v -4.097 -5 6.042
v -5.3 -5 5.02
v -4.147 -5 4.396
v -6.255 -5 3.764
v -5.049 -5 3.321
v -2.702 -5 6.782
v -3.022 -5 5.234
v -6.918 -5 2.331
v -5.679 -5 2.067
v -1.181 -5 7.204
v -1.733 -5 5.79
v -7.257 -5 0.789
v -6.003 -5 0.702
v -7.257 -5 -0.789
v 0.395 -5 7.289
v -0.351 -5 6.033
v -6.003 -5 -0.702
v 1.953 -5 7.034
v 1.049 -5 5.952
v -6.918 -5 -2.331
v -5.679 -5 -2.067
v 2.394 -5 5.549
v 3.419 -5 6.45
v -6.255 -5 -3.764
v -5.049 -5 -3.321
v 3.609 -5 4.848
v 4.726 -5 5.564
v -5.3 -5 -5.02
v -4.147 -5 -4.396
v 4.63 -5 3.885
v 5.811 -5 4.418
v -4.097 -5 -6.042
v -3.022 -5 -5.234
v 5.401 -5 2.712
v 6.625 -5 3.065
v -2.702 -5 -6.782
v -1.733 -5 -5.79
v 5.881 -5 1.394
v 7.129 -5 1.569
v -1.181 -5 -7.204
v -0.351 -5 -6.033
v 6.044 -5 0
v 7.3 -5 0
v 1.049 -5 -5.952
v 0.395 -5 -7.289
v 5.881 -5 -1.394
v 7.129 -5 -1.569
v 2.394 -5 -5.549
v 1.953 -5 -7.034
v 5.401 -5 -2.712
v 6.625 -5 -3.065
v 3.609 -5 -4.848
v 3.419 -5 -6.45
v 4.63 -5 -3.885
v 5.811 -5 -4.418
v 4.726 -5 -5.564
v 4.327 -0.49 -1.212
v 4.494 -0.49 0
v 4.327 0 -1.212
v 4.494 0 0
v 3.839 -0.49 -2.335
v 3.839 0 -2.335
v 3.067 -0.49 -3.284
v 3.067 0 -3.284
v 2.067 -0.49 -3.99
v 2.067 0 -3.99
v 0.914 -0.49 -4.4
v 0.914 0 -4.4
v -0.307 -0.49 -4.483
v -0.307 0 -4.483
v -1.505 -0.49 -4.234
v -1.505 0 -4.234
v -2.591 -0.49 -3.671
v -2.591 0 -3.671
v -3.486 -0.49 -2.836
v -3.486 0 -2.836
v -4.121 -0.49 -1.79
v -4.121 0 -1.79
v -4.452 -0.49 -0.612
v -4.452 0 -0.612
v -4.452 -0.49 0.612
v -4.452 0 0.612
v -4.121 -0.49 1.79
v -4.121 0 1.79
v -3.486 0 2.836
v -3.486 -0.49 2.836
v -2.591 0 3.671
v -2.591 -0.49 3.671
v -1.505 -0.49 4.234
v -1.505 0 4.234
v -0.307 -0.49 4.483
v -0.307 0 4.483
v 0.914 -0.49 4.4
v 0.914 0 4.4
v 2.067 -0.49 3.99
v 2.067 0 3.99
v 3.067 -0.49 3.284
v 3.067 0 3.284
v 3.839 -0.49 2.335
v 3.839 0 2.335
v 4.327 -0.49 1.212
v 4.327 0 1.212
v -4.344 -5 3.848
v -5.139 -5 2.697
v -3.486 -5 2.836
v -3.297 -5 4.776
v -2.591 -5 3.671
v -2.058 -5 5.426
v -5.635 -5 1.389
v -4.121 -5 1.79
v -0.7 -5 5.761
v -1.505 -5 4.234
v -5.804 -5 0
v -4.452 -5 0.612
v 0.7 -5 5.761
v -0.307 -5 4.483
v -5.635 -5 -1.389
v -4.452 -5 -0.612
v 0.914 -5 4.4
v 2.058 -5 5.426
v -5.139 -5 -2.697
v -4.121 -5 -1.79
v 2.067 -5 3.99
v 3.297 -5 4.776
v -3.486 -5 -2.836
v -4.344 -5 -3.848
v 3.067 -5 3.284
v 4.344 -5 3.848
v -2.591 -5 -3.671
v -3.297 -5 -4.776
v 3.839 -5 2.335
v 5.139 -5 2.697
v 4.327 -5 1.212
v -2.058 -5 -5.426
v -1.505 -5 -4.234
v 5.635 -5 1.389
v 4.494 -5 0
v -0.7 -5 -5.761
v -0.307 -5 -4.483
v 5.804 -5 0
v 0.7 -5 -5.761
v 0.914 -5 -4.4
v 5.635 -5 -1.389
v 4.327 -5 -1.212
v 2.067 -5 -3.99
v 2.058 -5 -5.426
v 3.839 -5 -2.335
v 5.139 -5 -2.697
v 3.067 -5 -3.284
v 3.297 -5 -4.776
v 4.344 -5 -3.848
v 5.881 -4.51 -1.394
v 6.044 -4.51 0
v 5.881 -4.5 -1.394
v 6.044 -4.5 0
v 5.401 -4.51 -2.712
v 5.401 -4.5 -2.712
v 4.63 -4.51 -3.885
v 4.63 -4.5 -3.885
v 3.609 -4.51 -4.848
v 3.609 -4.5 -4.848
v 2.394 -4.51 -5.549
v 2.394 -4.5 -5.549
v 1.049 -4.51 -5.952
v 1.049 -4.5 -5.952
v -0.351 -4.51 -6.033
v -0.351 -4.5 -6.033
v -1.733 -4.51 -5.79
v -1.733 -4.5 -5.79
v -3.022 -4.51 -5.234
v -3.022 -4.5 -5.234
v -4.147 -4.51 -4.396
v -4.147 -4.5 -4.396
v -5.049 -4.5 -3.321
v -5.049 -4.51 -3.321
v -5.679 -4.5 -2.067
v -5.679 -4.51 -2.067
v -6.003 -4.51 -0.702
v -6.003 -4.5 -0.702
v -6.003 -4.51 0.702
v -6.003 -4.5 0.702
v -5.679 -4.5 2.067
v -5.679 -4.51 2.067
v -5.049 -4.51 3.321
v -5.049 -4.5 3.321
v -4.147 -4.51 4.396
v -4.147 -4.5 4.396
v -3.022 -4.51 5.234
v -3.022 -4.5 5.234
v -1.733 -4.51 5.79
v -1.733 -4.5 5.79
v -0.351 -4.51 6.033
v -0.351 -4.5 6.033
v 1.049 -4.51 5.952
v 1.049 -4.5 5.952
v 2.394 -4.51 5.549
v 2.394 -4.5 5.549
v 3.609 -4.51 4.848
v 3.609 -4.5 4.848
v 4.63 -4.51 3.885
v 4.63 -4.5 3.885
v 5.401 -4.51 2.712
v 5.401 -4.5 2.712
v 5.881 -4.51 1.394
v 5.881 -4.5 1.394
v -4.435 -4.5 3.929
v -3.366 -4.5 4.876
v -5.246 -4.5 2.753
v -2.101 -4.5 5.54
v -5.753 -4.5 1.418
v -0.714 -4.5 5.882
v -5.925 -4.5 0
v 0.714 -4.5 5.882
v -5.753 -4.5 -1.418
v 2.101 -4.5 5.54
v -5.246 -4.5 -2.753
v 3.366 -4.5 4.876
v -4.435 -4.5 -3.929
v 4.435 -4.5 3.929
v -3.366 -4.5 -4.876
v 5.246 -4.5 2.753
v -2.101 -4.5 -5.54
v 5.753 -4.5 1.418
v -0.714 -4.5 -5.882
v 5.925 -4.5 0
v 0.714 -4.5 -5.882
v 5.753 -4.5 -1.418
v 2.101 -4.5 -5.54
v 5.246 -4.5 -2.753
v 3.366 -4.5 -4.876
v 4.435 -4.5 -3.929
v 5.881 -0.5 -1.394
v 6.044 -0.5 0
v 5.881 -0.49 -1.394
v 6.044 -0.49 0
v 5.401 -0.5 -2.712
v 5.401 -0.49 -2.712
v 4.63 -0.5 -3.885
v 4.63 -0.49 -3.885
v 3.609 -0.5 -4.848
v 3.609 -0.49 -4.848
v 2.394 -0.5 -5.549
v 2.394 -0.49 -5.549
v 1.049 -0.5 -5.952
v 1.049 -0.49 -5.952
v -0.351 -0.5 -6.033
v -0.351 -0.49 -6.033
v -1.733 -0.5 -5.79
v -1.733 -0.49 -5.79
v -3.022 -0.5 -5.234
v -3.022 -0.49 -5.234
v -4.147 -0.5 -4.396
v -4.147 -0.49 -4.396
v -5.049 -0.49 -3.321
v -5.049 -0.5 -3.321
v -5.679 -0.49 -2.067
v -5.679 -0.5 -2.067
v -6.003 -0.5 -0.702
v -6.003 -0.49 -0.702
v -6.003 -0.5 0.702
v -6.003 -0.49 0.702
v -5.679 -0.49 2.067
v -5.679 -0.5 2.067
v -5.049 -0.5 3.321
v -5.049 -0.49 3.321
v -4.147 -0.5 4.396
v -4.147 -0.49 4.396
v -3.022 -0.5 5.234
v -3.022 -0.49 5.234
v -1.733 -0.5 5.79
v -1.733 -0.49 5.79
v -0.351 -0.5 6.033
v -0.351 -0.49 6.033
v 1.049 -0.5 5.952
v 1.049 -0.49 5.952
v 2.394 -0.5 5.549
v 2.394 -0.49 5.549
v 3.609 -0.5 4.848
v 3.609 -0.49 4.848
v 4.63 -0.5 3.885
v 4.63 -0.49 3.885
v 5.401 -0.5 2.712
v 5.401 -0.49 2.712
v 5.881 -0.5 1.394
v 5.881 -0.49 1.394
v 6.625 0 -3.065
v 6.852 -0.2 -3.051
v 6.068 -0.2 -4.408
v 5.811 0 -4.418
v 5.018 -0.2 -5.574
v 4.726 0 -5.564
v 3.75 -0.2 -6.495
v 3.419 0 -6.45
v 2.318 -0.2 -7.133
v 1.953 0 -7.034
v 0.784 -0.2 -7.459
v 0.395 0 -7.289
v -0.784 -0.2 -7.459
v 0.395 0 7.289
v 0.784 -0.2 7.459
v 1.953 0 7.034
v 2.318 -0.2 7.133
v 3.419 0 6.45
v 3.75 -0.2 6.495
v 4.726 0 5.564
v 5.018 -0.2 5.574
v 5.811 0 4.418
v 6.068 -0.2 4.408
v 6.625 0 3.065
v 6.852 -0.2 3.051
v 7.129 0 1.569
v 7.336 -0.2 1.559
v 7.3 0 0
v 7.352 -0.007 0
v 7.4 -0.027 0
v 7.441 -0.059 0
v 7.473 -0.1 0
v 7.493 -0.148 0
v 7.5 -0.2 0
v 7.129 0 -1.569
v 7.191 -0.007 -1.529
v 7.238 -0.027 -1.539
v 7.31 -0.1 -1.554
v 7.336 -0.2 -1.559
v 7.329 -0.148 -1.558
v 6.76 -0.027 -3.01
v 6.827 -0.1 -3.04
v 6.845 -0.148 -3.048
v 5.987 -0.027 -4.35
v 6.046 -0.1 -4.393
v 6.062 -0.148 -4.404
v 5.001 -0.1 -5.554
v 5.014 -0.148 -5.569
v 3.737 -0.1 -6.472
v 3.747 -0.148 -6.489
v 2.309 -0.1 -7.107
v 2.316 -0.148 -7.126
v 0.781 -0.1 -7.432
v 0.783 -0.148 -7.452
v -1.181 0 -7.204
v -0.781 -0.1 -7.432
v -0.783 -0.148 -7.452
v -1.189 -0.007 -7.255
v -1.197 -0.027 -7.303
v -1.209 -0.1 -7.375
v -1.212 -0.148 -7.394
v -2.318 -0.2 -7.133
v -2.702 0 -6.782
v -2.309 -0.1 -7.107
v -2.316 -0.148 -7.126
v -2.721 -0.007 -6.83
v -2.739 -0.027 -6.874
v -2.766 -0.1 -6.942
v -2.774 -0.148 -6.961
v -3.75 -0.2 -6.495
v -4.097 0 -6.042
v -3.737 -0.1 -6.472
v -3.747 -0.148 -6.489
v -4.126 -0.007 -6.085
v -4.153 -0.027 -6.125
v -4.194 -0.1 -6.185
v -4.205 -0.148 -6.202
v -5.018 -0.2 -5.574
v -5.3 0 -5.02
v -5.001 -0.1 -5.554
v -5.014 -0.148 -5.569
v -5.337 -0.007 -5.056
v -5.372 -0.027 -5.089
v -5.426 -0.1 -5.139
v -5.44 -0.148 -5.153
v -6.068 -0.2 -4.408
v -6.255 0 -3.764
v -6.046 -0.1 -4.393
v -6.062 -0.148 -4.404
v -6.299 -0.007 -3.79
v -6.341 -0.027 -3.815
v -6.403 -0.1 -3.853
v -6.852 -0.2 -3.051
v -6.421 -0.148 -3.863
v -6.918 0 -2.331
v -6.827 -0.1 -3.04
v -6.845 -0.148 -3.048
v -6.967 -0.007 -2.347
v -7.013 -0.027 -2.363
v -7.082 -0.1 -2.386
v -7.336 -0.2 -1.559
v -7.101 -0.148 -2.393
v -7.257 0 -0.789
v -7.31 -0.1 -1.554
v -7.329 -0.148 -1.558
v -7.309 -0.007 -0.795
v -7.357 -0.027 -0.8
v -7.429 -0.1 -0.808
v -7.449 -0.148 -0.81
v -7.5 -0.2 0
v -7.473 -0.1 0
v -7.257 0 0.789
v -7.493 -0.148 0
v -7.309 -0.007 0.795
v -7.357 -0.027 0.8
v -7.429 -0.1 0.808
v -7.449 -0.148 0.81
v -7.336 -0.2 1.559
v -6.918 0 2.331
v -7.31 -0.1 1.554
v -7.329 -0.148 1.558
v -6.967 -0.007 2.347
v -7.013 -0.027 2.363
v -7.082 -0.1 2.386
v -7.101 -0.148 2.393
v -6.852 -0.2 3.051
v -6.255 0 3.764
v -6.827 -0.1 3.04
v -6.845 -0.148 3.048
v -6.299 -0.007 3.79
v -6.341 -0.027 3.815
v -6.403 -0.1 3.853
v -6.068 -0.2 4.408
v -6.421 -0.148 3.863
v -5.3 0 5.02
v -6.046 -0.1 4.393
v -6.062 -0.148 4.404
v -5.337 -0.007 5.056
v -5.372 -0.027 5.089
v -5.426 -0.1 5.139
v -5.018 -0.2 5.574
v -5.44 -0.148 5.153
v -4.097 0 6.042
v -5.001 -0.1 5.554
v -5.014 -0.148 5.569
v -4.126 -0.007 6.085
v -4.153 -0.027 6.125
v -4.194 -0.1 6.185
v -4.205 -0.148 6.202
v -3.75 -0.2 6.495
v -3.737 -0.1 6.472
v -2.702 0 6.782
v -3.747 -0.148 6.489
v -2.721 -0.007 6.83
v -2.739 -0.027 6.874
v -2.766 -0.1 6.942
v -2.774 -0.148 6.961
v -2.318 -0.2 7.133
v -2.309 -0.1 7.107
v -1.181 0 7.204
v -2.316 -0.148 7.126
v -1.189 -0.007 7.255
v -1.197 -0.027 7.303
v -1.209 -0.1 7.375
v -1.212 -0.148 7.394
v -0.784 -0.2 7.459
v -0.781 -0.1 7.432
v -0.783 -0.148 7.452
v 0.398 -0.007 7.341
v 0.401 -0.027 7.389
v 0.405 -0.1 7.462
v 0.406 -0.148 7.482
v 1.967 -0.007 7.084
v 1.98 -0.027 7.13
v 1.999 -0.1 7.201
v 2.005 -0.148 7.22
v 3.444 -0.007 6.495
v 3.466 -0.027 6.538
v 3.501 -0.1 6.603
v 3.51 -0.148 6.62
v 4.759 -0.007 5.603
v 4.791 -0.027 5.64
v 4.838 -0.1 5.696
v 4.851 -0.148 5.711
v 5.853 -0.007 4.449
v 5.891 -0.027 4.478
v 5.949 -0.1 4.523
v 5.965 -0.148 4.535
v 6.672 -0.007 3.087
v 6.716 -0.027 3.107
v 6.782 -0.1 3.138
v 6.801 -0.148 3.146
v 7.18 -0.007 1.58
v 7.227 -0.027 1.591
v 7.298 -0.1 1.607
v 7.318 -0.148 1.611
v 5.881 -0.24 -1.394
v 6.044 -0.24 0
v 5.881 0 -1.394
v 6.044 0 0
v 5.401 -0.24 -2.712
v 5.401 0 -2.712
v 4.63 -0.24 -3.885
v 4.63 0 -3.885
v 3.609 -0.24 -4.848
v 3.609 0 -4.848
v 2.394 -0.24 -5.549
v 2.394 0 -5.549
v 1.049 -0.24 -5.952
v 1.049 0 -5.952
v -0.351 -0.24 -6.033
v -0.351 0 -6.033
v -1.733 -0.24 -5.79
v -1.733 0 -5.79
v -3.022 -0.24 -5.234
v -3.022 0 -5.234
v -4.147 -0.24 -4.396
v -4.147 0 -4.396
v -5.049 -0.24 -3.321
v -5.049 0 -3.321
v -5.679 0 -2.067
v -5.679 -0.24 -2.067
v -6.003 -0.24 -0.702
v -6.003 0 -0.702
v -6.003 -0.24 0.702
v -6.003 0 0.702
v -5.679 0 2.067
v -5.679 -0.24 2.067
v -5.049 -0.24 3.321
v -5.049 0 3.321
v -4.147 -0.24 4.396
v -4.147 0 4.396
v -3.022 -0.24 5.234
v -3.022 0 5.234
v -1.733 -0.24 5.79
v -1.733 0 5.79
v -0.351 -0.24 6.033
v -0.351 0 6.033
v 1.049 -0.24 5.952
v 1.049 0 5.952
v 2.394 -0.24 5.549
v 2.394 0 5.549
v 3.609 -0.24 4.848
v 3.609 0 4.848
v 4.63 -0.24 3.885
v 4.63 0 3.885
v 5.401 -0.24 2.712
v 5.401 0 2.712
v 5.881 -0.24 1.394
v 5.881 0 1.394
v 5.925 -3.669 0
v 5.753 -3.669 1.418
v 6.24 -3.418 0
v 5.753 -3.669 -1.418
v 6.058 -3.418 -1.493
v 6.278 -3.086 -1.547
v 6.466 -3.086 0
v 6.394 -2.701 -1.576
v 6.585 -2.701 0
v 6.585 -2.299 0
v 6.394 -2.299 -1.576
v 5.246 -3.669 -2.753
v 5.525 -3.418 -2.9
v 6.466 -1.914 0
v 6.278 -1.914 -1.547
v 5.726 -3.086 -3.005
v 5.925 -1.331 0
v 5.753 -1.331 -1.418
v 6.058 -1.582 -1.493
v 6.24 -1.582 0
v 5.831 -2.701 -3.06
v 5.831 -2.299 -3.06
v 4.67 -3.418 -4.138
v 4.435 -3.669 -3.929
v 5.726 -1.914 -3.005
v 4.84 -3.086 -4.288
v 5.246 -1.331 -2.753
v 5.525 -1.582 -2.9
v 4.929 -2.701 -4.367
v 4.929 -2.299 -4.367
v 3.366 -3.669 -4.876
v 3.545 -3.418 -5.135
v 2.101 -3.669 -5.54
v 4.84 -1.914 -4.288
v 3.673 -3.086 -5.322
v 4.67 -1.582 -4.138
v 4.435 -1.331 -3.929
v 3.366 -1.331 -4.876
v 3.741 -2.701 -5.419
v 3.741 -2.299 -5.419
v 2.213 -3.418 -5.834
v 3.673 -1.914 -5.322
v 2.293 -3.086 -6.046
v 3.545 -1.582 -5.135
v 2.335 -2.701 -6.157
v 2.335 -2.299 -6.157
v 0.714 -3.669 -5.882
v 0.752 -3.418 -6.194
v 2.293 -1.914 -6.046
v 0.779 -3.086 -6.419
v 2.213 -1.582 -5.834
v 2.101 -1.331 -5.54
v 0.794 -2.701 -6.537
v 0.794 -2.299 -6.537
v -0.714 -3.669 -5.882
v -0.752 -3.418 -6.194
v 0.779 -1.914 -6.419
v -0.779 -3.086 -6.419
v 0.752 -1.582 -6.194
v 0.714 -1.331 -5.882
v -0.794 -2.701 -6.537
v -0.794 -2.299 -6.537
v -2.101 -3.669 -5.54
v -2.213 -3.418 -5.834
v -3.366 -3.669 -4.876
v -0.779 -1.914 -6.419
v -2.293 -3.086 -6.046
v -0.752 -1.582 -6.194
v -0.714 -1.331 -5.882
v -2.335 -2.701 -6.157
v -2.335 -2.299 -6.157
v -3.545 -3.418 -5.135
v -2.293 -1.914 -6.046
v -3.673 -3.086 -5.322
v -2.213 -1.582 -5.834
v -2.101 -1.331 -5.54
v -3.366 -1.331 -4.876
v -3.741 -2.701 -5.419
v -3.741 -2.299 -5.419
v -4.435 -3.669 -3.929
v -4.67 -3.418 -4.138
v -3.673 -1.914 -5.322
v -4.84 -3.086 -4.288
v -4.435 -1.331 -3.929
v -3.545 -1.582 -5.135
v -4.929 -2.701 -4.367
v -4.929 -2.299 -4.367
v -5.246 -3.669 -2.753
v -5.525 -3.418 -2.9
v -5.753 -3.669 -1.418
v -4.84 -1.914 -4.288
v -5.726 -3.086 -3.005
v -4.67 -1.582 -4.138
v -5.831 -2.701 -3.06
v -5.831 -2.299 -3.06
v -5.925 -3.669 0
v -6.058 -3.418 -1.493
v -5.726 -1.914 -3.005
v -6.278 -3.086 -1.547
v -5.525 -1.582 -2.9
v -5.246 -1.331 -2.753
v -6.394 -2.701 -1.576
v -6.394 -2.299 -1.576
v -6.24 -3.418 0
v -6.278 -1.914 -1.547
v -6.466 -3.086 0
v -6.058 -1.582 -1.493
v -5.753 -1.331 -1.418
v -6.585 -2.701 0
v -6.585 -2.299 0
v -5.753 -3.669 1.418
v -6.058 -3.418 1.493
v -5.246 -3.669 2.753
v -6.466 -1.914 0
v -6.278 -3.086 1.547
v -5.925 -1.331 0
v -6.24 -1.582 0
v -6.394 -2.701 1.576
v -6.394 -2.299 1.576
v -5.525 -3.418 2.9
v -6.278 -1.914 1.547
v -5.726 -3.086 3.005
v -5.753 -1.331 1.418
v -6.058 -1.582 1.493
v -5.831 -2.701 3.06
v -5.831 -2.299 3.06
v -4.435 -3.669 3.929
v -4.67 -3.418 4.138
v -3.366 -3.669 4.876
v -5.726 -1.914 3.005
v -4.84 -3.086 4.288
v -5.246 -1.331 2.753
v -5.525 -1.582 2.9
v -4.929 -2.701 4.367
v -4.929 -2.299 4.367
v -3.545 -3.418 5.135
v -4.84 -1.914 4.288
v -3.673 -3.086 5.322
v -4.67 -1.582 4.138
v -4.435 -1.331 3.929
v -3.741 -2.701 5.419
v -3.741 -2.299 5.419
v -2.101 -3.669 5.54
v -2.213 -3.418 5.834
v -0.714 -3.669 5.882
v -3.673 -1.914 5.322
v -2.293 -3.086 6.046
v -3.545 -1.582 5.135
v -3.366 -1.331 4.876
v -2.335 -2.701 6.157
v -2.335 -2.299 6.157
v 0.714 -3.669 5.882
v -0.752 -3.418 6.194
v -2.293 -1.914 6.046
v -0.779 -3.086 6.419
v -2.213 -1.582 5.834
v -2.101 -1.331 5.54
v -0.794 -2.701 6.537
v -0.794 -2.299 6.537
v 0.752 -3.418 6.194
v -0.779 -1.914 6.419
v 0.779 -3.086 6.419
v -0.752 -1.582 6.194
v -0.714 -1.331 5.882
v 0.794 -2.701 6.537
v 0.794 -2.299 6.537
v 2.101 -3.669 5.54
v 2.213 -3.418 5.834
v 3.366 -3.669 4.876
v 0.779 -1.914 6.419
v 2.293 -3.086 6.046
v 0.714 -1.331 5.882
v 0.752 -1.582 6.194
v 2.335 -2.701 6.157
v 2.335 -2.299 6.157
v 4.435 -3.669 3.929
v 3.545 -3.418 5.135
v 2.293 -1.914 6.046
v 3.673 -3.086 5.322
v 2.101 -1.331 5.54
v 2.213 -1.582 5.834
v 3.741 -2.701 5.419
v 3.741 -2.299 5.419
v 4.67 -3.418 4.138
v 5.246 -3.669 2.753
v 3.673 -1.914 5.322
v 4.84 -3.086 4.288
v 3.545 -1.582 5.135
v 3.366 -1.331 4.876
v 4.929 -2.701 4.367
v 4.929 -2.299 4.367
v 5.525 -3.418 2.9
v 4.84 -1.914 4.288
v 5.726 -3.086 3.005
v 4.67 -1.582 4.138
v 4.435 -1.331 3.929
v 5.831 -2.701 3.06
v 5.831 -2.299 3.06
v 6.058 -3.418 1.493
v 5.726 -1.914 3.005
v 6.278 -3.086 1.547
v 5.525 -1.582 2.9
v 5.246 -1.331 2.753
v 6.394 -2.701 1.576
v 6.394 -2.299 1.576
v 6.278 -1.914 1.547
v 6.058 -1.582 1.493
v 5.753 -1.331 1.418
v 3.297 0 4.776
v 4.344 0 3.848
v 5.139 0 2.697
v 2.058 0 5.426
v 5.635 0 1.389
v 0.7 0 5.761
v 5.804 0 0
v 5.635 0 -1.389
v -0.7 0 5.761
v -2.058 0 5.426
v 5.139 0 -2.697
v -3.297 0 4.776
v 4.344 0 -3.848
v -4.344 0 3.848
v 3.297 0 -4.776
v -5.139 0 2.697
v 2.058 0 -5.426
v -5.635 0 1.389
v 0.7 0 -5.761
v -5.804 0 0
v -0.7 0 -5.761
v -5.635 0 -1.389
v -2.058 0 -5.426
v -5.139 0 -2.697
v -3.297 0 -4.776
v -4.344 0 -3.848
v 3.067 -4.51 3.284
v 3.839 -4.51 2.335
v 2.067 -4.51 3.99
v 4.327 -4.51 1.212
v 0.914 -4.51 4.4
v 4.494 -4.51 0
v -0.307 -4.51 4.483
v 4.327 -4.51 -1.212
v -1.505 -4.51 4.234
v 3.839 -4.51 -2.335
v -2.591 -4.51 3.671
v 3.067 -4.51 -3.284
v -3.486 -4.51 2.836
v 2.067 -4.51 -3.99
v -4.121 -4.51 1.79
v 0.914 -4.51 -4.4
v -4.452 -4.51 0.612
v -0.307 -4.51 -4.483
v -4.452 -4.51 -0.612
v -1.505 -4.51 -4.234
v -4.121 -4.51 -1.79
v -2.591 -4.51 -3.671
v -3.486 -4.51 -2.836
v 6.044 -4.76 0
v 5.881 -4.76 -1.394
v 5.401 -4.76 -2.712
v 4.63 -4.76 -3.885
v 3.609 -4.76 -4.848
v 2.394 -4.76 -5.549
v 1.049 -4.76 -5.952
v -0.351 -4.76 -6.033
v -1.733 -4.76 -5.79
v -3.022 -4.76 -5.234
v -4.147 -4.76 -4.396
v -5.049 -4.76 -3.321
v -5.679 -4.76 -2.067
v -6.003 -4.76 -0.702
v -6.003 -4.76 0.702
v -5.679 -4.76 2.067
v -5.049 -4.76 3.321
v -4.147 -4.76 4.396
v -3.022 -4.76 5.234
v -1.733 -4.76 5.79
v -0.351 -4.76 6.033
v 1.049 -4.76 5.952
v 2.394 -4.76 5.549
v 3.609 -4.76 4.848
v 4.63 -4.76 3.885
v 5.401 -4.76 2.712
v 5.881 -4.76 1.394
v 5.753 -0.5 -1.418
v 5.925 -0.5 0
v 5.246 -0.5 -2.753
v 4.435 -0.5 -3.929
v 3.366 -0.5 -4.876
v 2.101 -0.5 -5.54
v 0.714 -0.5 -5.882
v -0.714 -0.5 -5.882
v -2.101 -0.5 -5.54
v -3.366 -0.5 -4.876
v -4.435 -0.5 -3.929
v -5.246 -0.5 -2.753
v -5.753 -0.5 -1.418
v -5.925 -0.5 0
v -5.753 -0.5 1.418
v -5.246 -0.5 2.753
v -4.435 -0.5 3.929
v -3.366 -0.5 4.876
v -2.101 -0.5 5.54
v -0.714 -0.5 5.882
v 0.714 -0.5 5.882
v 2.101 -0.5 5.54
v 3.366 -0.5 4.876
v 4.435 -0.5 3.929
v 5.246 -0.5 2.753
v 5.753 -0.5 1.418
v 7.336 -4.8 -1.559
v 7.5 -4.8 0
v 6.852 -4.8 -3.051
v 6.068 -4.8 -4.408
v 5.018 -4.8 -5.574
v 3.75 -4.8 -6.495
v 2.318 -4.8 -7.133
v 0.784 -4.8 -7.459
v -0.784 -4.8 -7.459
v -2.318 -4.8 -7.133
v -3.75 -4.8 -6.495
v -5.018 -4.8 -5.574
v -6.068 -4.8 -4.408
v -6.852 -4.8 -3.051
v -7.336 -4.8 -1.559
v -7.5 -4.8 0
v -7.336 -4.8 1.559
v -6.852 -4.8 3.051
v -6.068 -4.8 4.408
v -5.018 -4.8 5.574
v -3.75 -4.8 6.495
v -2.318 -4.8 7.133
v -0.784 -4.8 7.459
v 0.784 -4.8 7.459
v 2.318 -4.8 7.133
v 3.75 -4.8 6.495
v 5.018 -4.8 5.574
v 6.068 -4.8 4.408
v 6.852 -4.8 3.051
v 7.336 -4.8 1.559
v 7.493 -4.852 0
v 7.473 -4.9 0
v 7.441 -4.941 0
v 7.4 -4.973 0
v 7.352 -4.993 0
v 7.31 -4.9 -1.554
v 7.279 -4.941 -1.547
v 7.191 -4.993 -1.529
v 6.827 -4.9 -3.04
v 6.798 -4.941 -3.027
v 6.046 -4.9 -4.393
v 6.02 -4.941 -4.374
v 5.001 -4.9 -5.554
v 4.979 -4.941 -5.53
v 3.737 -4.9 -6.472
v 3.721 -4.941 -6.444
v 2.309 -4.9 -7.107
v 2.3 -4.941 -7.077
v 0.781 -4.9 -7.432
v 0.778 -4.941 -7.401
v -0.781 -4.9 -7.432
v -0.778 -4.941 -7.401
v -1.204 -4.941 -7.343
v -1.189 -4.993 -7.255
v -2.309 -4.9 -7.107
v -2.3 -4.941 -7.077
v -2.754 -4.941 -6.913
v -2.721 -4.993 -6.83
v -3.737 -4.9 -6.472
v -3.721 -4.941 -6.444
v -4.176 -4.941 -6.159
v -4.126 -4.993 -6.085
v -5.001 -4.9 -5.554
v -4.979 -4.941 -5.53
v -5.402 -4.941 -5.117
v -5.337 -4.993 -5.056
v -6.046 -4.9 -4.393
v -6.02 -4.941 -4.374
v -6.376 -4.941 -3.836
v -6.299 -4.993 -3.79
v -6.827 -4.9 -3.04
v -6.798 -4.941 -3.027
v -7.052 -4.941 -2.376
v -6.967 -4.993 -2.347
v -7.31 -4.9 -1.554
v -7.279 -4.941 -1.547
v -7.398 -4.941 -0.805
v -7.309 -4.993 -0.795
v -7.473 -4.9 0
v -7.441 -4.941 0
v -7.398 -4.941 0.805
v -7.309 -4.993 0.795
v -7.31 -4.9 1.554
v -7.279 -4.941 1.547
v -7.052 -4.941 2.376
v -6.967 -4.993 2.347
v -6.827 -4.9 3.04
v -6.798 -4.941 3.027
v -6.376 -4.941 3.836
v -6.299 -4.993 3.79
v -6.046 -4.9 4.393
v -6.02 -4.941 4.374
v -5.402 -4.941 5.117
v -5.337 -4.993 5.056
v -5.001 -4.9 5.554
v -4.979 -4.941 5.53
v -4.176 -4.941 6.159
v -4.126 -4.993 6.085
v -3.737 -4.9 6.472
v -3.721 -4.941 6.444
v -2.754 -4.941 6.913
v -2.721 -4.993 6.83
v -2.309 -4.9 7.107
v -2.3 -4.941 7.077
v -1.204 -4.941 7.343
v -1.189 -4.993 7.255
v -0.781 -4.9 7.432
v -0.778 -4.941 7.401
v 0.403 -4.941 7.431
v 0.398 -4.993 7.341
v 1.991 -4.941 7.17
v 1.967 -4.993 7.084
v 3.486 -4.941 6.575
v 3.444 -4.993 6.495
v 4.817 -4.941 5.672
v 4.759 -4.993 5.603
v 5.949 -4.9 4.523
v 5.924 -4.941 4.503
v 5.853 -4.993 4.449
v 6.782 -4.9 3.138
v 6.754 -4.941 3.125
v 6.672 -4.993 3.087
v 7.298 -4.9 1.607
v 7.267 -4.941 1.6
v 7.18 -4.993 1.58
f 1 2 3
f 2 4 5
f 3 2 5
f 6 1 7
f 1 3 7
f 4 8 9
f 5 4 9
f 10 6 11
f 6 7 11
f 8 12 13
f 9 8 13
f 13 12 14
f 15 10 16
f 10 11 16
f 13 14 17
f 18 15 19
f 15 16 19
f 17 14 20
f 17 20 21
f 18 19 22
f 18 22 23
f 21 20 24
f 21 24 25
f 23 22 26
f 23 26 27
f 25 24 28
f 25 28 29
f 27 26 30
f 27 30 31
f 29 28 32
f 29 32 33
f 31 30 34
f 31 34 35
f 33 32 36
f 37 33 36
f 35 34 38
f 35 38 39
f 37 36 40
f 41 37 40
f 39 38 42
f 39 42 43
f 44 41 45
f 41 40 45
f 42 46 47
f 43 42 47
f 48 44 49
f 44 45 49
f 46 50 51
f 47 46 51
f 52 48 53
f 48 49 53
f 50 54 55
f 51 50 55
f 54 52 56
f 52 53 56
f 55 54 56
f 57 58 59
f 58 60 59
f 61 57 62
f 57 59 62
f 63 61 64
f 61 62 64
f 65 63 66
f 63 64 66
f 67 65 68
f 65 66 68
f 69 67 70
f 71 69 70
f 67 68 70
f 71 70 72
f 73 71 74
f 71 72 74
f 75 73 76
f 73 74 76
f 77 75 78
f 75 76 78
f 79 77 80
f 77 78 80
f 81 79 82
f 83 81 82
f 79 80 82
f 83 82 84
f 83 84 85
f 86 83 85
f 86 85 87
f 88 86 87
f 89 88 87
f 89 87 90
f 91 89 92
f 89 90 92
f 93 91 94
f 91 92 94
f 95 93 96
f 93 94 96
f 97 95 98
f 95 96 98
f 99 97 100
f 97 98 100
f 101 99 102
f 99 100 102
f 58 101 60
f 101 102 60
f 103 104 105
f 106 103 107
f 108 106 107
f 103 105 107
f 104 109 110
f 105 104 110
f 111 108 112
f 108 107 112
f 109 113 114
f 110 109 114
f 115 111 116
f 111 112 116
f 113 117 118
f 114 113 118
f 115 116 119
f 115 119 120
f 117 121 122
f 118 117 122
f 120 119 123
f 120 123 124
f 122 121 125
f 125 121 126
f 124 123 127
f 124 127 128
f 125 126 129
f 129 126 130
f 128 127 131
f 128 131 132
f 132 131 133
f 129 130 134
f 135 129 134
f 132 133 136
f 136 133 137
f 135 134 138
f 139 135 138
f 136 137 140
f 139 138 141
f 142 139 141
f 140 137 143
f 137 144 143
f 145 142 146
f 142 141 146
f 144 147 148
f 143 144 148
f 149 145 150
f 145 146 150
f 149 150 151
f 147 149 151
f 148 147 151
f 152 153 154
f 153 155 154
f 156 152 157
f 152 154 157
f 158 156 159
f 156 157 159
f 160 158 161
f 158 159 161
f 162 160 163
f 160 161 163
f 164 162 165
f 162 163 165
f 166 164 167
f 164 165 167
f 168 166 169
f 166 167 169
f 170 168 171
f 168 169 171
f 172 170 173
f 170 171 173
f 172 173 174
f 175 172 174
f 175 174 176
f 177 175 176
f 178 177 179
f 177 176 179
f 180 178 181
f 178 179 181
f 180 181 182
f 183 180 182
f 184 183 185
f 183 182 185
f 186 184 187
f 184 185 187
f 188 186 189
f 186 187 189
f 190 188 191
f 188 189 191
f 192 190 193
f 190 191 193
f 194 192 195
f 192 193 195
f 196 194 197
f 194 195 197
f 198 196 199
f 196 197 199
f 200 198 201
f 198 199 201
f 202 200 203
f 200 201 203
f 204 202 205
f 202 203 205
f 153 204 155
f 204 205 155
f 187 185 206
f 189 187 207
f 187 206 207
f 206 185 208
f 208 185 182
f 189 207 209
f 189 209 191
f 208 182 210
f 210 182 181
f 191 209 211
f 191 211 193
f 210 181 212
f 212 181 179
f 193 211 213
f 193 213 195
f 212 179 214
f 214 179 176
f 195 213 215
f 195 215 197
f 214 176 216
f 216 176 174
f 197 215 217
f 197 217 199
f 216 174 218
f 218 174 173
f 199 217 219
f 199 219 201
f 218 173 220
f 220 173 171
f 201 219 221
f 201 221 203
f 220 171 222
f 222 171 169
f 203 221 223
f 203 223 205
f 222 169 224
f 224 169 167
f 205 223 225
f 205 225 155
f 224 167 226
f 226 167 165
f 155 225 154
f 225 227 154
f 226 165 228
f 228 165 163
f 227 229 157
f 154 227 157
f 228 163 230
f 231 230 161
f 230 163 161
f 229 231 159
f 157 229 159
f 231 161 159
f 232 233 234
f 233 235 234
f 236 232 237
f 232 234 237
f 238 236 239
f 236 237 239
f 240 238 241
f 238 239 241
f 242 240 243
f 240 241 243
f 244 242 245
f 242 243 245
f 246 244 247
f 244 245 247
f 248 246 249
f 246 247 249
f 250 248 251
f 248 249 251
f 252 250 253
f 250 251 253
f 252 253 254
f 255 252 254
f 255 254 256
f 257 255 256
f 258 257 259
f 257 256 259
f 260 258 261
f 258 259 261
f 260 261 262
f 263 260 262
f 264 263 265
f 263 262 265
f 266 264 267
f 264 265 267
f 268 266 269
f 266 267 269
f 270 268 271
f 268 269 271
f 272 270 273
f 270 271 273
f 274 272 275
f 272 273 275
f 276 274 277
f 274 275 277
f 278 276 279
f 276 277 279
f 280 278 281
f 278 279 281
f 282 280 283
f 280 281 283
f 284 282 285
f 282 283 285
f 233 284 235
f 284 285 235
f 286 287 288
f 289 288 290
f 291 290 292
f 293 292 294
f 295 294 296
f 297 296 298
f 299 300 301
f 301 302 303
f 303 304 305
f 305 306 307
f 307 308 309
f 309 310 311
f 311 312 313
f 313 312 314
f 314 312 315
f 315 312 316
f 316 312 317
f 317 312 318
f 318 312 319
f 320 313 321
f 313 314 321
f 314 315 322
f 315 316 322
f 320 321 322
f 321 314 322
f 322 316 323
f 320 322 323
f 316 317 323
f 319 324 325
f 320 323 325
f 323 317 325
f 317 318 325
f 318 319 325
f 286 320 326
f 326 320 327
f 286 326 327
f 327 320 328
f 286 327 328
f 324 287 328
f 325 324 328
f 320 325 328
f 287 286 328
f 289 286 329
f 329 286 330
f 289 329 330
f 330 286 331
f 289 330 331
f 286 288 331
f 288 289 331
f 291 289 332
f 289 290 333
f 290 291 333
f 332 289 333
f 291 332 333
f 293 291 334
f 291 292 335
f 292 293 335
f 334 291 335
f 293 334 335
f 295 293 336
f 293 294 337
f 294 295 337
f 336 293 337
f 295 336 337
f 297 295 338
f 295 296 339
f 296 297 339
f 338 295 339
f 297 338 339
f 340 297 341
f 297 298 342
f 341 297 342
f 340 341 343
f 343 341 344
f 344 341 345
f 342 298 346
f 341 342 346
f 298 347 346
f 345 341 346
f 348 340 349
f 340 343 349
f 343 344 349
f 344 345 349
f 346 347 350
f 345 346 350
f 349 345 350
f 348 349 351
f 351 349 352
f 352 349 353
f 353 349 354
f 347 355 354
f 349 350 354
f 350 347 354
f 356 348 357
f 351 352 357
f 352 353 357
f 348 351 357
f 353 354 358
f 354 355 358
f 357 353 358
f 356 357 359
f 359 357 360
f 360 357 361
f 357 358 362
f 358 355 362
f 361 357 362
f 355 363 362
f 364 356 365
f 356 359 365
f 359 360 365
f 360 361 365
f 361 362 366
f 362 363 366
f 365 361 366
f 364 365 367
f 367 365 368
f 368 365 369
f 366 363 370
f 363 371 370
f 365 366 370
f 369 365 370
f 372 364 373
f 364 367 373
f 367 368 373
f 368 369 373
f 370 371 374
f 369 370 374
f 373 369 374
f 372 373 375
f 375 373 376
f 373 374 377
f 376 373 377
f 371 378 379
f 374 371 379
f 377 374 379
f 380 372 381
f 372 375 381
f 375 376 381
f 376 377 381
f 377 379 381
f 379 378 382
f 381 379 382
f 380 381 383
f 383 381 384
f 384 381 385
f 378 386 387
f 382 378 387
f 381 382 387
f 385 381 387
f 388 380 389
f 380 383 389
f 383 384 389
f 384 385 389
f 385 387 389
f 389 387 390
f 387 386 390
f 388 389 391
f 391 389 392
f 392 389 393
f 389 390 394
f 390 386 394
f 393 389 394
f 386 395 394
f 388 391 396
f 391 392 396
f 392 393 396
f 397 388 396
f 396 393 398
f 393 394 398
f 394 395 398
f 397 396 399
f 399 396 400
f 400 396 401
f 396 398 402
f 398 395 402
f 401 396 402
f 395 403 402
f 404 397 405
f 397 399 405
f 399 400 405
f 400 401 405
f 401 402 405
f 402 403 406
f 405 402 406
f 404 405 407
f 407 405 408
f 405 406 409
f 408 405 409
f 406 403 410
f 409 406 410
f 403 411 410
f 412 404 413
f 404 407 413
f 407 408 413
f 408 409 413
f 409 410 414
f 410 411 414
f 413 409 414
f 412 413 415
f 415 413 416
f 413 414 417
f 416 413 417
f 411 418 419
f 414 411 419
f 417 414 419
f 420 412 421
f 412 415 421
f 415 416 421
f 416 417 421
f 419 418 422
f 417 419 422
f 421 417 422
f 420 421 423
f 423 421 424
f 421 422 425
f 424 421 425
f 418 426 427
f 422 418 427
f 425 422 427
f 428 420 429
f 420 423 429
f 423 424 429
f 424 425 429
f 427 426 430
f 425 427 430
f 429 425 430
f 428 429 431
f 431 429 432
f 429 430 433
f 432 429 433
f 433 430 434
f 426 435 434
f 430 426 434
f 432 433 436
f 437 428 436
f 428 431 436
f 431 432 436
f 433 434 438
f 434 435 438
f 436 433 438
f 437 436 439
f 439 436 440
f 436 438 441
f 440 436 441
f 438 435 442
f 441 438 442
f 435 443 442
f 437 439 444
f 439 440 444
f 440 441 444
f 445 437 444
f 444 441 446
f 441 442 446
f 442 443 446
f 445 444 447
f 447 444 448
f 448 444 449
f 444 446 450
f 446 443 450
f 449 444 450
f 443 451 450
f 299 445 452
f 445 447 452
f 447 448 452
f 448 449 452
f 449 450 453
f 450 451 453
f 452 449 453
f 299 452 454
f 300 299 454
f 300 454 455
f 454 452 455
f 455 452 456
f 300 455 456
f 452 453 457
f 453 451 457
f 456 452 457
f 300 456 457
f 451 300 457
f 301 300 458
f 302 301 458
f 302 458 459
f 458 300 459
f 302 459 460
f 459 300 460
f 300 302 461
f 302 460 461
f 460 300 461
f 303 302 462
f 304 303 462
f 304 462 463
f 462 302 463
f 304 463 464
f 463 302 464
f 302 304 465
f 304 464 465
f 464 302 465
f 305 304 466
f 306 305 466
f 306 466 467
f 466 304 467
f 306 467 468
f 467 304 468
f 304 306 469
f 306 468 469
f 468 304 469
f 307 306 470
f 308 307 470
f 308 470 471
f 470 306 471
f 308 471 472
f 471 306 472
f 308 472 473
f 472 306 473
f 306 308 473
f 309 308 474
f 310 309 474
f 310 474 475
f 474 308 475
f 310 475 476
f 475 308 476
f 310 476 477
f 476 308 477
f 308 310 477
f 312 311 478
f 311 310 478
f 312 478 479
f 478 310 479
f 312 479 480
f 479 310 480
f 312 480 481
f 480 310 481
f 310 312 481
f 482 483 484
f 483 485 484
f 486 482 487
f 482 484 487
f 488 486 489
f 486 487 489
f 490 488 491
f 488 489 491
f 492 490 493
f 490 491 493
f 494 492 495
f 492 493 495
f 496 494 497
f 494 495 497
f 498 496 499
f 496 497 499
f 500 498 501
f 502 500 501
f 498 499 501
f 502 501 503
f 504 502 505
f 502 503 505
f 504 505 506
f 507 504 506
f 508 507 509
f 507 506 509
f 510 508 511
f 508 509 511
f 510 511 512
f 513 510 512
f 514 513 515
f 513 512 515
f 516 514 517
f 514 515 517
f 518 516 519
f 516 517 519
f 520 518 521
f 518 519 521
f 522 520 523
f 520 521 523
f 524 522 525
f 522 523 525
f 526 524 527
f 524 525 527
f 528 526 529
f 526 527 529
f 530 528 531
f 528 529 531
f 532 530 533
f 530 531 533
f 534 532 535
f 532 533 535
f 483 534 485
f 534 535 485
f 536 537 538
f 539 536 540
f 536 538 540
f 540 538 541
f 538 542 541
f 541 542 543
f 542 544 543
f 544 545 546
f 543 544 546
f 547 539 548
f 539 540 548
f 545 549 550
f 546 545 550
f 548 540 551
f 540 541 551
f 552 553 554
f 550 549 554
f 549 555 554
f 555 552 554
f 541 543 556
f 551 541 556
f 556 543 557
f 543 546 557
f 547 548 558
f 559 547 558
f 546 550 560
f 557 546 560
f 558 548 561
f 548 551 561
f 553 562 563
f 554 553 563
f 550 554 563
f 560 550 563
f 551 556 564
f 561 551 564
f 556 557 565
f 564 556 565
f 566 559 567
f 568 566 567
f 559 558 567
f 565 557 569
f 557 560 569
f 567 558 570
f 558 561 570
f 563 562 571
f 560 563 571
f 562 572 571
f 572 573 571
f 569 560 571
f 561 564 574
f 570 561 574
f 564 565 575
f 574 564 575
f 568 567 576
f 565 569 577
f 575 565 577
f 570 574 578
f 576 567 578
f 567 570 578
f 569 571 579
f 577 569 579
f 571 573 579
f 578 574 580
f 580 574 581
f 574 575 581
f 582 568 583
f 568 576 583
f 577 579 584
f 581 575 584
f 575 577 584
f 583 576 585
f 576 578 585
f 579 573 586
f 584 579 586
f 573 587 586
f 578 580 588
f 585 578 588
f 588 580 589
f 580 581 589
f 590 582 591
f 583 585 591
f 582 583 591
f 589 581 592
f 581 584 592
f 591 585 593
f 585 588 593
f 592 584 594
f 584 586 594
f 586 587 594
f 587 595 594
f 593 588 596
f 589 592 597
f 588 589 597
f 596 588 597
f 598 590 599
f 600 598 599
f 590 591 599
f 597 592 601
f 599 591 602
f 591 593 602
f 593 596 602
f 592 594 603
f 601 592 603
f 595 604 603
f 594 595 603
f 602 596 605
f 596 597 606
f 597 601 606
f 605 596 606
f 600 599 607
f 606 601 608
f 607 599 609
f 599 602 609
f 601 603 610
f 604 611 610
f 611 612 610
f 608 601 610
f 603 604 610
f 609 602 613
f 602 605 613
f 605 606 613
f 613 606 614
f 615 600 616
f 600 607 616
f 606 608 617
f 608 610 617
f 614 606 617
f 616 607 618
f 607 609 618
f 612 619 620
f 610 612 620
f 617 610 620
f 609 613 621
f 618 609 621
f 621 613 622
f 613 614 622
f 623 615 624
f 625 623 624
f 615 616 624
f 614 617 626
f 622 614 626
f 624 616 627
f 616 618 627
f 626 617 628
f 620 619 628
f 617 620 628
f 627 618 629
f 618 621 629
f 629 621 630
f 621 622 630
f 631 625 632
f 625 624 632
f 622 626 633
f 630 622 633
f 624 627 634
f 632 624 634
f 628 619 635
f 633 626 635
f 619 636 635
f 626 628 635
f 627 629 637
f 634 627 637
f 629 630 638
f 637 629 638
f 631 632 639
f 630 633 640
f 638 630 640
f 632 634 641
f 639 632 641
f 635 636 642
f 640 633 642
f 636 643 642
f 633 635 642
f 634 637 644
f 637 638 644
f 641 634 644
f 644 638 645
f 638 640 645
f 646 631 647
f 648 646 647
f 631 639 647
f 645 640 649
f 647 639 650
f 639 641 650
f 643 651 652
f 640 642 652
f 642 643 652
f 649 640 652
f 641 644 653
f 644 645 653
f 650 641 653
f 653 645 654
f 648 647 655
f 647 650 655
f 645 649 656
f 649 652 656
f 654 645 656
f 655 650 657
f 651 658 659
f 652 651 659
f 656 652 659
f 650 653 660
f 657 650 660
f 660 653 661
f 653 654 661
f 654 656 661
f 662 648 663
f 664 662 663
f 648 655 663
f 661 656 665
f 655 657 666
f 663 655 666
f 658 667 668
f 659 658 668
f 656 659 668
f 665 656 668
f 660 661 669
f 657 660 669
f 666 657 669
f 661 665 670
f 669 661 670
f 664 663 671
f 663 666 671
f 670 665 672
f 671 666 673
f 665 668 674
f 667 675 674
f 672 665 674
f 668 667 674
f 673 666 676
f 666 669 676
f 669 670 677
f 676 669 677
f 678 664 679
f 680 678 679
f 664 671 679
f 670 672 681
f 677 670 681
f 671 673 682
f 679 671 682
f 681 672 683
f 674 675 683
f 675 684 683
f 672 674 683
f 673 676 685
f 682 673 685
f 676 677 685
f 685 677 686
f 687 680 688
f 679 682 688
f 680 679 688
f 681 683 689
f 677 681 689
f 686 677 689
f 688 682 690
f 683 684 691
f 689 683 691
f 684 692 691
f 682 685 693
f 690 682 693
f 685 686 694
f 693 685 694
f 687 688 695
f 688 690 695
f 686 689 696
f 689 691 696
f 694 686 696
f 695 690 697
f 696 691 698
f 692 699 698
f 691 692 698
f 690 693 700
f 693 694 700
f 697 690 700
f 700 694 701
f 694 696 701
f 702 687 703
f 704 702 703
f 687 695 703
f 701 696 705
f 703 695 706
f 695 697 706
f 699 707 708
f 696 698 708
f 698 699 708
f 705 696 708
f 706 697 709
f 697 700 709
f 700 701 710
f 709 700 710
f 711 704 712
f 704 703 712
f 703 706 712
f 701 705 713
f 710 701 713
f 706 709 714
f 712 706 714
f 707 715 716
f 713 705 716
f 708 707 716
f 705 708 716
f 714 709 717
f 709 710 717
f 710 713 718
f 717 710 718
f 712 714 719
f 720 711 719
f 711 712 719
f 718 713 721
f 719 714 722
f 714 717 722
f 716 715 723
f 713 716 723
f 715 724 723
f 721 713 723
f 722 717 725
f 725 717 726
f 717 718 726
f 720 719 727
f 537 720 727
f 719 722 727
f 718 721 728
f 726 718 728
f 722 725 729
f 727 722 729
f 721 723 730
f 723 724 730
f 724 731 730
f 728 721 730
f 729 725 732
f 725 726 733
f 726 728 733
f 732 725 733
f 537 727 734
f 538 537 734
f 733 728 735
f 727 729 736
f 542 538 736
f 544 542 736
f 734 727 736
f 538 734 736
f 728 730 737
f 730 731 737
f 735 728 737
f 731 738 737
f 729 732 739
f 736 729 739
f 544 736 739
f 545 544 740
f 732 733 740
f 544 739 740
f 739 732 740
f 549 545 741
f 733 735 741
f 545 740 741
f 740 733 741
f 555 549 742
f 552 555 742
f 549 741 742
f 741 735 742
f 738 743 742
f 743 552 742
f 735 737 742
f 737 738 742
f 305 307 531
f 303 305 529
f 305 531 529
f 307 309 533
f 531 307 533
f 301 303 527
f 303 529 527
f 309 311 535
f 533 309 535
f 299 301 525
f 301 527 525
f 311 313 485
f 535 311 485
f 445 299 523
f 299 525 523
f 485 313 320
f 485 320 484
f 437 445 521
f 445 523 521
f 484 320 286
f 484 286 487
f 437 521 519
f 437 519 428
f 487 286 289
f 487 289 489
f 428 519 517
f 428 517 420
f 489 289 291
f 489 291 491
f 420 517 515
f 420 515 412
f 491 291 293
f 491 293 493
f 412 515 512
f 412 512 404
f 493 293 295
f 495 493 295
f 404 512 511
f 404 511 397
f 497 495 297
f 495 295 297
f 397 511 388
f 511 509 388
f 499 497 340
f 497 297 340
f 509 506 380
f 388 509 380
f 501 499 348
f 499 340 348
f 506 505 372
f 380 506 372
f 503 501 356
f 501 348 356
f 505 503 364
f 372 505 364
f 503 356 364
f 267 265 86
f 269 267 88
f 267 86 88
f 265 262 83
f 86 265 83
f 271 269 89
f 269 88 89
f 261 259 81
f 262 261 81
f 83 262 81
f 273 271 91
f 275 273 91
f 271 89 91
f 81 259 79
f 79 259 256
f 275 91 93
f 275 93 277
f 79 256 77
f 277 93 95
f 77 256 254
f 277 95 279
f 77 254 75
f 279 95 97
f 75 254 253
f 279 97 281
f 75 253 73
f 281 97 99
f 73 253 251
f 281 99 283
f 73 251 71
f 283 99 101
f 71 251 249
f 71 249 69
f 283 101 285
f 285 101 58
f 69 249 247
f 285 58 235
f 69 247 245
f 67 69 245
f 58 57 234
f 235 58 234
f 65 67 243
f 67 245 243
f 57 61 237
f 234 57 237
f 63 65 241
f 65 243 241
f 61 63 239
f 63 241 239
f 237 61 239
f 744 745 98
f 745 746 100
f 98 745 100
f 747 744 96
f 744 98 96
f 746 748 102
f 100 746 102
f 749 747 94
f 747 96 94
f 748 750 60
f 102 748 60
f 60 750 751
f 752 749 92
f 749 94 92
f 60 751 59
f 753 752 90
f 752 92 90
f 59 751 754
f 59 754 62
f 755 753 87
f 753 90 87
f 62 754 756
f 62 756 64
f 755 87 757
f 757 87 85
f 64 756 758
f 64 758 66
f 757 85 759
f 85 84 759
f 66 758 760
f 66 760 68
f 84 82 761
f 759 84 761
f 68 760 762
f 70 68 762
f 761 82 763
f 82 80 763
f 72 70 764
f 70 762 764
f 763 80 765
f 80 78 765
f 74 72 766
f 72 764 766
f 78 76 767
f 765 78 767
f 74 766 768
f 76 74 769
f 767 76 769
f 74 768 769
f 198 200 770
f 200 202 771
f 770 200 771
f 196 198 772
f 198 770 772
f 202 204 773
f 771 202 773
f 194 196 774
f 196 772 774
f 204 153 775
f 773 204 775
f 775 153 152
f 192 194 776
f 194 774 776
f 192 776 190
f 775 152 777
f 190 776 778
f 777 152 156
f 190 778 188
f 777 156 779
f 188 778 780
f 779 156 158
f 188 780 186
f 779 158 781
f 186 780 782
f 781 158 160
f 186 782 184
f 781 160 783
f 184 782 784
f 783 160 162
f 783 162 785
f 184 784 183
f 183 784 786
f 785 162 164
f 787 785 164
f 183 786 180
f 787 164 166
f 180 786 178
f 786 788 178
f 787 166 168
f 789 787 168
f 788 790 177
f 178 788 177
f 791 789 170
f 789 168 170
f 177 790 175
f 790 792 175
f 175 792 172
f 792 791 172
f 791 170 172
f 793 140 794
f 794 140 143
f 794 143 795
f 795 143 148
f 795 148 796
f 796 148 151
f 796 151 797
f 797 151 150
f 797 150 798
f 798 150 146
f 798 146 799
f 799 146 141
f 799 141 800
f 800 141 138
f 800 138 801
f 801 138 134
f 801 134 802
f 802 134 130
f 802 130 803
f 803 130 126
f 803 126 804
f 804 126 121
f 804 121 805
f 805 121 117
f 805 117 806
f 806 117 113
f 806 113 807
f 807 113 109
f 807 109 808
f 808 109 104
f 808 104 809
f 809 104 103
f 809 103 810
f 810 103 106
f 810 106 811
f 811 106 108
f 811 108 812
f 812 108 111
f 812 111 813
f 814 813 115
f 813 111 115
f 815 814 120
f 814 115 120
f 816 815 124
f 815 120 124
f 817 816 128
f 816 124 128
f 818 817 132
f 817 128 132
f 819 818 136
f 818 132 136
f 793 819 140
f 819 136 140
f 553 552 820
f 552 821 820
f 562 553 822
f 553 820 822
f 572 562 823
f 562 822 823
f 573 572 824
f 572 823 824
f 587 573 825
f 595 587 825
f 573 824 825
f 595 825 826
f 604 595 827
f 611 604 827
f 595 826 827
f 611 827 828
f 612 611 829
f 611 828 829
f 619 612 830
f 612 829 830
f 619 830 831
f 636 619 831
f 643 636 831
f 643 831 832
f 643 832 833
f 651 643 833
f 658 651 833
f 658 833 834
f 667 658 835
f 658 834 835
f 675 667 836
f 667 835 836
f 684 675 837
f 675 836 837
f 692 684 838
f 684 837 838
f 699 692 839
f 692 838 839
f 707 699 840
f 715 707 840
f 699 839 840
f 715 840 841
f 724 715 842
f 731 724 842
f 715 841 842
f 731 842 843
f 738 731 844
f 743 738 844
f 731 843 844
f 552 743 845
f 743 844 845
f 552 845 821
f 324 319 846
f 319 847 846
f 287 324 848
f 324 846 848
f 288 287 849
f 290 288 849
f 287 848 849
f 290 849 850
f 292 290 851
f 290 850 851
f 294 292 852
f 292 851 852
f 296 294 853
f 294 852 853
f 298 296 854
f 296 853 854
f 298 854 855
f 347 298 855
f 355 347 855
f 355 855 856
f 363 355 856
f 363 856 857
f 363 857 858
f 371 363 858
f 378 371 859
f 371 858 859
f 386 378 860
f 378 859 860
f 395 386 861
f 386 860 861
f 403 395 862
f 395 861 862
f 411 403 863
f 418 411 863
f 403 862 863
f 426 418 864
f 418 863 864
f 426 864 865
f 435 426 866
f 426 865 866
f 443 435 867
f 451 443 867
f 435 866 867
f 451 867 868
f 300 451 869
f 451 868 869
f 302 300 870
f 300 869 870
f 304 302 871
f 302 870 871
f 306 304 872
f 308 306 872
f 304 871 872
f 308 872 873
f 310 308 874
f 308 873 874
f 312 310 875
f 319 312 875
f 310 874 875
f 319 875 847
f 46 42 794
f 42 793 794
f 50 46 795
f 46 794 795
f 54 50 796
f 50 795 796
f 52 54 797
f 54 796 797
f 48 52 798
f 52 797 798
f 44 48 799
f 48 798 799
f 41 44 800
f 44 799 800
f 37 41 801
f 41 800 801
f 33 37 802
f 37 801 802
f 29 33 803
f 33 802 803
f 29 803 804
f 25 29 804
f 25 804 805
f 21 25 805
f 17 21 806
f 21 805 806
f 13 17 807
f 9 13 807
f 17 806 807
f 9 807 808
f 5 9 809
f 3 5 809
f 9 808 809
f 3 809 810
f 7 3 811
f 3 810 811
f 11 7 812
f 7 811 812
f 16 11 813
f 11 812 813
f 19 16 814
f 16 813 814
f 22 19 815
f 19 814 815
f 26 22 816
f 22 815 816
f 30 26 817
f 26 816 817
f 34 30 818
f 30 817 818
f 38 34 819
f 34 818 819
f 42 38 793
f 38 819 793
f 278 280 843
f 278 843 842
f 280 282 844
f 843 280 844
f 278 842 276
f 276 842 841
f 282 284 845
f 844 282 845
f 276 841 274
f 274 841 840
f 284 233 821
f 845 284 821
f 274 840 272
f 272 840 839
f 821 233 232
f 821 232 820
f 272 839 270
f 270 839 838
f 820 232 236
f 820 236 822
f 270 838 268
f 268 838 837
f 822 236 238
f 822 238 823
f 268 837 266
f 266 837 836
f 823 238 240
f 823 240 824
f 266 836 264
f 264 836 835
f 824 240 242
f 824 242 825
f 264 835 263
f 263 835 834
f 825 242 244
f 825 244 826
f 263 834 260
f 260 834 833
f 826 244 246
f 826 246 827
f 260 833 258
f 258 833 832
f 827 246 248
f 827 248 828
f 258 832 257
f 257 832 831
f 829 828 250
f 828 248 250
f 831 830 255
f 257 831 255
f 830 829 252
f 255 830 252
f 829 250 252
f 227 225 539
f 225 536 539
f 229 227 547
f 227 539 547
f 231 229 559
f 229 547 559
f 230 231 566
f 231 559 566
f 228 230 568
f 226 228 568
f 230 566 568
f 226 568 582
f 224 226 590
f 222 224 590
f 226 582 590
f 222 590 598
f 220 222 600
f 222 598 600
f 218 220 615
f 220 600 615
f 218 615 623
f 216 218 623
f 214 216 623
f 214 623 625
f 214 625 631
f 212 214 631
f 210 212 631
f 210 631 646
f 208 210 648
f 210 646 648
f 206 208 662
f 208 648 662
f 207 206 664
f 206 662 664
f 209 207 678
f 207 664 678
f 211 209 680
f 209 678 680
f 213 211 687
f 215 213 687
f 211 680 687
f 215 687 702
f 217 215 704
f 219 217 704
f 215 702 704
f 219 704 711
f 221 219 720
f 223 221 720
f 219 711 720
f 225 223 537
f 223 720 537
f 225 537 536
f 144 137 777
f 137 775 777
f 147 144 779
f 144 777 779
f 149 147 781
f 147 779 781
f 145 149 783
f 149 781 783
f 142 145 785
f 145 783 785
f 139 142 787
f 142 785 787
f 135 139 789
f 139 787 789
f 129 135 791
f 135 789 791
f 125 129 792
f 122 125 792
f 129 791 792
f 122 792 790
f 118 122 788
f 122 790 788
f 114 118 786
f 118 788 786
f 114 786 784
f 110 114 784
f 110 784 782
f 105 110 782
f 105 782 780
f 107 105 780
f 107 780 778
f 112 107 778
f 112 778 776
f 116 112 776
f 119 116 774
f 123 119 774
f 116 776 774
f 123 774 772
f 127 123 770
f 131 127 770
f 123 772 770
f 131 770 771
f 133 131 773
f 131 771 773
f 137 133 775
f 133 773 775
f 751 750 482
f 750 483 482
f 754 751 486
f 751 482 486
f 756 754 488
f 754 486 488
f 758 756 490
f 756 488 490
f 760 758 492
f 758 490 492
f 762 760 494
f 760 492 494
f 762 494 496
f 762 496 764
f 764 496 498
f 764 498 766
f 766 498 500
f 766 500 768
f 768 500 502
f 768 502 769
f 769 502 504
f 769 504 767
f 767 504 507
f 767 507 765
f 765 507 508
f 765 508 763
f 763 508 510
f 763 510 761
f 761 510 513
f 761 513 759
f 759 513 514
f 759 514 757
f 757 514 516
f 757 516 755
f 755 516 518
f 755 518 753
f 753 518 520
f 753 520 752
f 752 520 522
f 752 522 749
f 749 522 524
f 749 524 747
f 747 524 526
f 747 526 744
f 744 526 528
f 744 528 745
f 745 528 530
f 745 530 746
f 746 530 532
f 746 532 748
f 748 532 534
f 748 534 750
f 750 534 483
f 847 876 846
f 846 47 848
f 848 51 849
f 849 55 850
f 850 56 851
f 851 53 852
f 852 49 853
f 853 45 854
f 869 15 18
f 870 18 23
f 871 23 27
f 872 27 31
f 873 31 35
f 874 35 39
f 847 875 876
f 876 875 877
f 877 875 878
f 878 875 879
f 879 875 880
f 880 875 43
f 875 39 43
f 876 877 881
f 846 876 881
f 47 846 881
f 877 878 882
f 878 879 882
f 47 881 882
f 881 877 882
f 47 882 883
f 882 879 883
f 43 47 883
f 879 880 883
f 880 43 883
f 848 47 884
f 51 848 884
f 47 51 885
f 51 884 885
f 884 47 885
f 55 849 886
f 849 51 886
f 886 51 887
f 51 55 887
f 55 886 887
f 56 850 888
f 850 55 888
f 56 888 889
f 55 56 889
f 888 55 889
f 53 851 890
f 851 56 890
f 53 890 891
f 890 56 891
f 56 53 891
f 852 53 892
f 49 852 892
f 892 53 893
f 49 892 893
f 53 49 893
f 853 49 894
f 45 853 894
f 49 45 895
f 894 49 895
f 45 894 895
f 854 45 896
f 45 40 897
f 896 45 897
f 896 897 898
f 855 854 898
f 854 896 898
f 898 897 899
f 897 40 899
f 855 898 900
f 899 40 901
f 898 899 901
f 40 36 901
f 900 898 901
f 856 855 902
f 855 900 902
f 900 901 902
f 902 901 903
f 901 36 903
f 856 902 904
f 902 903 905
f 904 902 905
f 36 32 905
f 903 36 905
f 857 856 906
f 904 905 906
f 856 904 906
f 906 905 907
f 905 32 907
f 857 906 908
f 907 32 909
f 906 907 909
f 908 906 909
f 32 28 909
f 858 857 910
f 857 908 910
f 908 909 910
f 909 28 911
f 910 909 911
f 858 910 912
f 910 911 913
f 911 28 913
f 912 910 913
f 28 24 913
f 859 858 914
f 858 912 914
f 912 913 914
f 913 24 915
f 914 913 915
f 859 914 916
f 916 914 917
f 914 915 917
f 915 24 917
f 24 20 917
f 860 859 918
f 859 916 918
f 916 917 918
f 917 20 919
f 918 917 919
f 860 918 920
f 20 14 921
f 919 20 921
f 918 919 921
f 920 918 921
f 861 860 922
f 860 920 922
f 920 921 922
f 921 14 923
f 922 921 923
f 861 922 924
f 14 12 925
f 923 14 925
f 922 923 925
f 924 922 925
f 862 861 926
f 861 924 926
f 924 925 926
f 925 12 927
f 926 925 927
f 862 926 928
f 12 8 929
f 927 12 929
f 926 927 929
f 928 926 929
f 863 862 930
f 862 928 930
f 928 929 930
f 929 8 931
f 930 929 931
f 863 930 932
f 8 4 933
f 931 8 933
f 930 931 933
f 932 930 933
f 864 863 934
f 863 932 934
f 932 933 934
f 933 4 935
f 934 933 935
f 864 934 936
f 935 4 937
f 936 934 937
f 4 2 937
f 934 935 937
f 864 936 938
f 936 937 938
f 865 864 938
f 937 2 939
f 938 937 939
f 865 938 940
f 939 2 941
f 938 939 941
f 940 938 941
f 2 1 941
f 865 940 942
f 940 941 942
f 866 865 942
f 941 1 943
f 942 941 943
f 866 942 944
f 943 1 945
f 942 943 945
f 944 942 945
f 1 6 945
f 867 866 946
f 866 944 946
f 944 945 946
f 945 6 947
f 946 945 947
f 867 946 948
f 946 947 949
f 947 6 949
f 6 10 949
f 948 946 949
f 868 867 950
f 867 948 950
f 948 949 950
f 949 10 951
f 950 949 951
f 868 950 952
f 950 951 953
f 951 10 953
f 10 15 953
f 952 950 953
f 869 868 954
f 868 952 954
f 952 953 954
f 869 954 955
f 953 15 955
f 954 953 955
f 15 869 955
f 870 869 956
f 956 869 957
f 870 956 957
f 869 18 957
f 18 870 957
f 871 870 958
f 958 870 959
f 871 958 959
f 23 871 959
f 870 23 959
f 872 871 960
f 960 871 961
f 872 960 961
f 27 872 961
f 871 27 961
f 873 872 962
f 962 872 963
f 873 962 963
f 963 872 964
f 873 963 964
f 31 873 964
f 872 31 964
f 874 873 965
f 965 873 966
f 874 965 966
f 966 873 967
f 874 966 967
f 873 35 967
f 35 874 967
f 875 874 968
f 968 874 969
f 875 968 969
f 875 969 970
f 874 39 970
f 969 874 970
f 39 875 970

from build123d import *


with BuildPart() as part:
    # Sketch1 → Revolve1 (revolve)
    with BuildSketch(Plane(origin=(0, 0, 0), x_dir=(-1, 0, 0), z_dir=(0, 0, -1))):
        with BuildLine():
            Line((-5.925, -4.5), (-5.925, -3.669134295))
            ThreePointArc((-5.925, -3.669134295), (-6.6, -2.5), (-5.925, -1.330865705))
            Line((-5.925, -1.330865705), (-5.925, -0.5))
            Line((-5.925, -0.5), (-6.0435, -0.5))
            Line((-6.0435, -0.5), (-6.0435, -0.49))
            Line((-6.0435, -0.49), (-4.4935, -0.49))
            Line((-4.4935, -0.49), (-4.4935, 0))
            Line((-4.4935, 0), (-5.8035, 0))
            Line((-5.8035, 0), (-6.0435, -0.24))
            Line((-6.0435, -0.24), (-6.0435, 0))
            Line((-6.0435, 0), (-7.3, 0))
            ThreePointArc((-7.3, 0), (-7.441421356, -0.058578644), (-7.5, -0.2))
            Line((-7.5, -0.2), (-7.5, -4.8))
            ThreePointArc((-7.5, -4.8), (-7.441421356, -4.941421356), (-7.3, -5))
            Line((-7.3, -5), (-6.0435, -5))
            Line((-6.0435, -5), (-6.0435, -4.76))
            Line((-6.0435, -4.76), (-5.8035, -5))
            Line((-5.8035, -5), (-4.4935, -5))
            Line((-4.4935, -5), (-4.4935, -4.51))
            Line((-4.4935, -4.51), (-6.0435, -4.51))
            Line((-6.0435, -4.51), (-6.0435, -4.5))
            Line((-6.0435, -4.5), (-5.925, -4.5))
        make_face()
    revolve(axis=Axis((0, -5.001250002, 0), (0, 1, 0)))


solid = part.part
